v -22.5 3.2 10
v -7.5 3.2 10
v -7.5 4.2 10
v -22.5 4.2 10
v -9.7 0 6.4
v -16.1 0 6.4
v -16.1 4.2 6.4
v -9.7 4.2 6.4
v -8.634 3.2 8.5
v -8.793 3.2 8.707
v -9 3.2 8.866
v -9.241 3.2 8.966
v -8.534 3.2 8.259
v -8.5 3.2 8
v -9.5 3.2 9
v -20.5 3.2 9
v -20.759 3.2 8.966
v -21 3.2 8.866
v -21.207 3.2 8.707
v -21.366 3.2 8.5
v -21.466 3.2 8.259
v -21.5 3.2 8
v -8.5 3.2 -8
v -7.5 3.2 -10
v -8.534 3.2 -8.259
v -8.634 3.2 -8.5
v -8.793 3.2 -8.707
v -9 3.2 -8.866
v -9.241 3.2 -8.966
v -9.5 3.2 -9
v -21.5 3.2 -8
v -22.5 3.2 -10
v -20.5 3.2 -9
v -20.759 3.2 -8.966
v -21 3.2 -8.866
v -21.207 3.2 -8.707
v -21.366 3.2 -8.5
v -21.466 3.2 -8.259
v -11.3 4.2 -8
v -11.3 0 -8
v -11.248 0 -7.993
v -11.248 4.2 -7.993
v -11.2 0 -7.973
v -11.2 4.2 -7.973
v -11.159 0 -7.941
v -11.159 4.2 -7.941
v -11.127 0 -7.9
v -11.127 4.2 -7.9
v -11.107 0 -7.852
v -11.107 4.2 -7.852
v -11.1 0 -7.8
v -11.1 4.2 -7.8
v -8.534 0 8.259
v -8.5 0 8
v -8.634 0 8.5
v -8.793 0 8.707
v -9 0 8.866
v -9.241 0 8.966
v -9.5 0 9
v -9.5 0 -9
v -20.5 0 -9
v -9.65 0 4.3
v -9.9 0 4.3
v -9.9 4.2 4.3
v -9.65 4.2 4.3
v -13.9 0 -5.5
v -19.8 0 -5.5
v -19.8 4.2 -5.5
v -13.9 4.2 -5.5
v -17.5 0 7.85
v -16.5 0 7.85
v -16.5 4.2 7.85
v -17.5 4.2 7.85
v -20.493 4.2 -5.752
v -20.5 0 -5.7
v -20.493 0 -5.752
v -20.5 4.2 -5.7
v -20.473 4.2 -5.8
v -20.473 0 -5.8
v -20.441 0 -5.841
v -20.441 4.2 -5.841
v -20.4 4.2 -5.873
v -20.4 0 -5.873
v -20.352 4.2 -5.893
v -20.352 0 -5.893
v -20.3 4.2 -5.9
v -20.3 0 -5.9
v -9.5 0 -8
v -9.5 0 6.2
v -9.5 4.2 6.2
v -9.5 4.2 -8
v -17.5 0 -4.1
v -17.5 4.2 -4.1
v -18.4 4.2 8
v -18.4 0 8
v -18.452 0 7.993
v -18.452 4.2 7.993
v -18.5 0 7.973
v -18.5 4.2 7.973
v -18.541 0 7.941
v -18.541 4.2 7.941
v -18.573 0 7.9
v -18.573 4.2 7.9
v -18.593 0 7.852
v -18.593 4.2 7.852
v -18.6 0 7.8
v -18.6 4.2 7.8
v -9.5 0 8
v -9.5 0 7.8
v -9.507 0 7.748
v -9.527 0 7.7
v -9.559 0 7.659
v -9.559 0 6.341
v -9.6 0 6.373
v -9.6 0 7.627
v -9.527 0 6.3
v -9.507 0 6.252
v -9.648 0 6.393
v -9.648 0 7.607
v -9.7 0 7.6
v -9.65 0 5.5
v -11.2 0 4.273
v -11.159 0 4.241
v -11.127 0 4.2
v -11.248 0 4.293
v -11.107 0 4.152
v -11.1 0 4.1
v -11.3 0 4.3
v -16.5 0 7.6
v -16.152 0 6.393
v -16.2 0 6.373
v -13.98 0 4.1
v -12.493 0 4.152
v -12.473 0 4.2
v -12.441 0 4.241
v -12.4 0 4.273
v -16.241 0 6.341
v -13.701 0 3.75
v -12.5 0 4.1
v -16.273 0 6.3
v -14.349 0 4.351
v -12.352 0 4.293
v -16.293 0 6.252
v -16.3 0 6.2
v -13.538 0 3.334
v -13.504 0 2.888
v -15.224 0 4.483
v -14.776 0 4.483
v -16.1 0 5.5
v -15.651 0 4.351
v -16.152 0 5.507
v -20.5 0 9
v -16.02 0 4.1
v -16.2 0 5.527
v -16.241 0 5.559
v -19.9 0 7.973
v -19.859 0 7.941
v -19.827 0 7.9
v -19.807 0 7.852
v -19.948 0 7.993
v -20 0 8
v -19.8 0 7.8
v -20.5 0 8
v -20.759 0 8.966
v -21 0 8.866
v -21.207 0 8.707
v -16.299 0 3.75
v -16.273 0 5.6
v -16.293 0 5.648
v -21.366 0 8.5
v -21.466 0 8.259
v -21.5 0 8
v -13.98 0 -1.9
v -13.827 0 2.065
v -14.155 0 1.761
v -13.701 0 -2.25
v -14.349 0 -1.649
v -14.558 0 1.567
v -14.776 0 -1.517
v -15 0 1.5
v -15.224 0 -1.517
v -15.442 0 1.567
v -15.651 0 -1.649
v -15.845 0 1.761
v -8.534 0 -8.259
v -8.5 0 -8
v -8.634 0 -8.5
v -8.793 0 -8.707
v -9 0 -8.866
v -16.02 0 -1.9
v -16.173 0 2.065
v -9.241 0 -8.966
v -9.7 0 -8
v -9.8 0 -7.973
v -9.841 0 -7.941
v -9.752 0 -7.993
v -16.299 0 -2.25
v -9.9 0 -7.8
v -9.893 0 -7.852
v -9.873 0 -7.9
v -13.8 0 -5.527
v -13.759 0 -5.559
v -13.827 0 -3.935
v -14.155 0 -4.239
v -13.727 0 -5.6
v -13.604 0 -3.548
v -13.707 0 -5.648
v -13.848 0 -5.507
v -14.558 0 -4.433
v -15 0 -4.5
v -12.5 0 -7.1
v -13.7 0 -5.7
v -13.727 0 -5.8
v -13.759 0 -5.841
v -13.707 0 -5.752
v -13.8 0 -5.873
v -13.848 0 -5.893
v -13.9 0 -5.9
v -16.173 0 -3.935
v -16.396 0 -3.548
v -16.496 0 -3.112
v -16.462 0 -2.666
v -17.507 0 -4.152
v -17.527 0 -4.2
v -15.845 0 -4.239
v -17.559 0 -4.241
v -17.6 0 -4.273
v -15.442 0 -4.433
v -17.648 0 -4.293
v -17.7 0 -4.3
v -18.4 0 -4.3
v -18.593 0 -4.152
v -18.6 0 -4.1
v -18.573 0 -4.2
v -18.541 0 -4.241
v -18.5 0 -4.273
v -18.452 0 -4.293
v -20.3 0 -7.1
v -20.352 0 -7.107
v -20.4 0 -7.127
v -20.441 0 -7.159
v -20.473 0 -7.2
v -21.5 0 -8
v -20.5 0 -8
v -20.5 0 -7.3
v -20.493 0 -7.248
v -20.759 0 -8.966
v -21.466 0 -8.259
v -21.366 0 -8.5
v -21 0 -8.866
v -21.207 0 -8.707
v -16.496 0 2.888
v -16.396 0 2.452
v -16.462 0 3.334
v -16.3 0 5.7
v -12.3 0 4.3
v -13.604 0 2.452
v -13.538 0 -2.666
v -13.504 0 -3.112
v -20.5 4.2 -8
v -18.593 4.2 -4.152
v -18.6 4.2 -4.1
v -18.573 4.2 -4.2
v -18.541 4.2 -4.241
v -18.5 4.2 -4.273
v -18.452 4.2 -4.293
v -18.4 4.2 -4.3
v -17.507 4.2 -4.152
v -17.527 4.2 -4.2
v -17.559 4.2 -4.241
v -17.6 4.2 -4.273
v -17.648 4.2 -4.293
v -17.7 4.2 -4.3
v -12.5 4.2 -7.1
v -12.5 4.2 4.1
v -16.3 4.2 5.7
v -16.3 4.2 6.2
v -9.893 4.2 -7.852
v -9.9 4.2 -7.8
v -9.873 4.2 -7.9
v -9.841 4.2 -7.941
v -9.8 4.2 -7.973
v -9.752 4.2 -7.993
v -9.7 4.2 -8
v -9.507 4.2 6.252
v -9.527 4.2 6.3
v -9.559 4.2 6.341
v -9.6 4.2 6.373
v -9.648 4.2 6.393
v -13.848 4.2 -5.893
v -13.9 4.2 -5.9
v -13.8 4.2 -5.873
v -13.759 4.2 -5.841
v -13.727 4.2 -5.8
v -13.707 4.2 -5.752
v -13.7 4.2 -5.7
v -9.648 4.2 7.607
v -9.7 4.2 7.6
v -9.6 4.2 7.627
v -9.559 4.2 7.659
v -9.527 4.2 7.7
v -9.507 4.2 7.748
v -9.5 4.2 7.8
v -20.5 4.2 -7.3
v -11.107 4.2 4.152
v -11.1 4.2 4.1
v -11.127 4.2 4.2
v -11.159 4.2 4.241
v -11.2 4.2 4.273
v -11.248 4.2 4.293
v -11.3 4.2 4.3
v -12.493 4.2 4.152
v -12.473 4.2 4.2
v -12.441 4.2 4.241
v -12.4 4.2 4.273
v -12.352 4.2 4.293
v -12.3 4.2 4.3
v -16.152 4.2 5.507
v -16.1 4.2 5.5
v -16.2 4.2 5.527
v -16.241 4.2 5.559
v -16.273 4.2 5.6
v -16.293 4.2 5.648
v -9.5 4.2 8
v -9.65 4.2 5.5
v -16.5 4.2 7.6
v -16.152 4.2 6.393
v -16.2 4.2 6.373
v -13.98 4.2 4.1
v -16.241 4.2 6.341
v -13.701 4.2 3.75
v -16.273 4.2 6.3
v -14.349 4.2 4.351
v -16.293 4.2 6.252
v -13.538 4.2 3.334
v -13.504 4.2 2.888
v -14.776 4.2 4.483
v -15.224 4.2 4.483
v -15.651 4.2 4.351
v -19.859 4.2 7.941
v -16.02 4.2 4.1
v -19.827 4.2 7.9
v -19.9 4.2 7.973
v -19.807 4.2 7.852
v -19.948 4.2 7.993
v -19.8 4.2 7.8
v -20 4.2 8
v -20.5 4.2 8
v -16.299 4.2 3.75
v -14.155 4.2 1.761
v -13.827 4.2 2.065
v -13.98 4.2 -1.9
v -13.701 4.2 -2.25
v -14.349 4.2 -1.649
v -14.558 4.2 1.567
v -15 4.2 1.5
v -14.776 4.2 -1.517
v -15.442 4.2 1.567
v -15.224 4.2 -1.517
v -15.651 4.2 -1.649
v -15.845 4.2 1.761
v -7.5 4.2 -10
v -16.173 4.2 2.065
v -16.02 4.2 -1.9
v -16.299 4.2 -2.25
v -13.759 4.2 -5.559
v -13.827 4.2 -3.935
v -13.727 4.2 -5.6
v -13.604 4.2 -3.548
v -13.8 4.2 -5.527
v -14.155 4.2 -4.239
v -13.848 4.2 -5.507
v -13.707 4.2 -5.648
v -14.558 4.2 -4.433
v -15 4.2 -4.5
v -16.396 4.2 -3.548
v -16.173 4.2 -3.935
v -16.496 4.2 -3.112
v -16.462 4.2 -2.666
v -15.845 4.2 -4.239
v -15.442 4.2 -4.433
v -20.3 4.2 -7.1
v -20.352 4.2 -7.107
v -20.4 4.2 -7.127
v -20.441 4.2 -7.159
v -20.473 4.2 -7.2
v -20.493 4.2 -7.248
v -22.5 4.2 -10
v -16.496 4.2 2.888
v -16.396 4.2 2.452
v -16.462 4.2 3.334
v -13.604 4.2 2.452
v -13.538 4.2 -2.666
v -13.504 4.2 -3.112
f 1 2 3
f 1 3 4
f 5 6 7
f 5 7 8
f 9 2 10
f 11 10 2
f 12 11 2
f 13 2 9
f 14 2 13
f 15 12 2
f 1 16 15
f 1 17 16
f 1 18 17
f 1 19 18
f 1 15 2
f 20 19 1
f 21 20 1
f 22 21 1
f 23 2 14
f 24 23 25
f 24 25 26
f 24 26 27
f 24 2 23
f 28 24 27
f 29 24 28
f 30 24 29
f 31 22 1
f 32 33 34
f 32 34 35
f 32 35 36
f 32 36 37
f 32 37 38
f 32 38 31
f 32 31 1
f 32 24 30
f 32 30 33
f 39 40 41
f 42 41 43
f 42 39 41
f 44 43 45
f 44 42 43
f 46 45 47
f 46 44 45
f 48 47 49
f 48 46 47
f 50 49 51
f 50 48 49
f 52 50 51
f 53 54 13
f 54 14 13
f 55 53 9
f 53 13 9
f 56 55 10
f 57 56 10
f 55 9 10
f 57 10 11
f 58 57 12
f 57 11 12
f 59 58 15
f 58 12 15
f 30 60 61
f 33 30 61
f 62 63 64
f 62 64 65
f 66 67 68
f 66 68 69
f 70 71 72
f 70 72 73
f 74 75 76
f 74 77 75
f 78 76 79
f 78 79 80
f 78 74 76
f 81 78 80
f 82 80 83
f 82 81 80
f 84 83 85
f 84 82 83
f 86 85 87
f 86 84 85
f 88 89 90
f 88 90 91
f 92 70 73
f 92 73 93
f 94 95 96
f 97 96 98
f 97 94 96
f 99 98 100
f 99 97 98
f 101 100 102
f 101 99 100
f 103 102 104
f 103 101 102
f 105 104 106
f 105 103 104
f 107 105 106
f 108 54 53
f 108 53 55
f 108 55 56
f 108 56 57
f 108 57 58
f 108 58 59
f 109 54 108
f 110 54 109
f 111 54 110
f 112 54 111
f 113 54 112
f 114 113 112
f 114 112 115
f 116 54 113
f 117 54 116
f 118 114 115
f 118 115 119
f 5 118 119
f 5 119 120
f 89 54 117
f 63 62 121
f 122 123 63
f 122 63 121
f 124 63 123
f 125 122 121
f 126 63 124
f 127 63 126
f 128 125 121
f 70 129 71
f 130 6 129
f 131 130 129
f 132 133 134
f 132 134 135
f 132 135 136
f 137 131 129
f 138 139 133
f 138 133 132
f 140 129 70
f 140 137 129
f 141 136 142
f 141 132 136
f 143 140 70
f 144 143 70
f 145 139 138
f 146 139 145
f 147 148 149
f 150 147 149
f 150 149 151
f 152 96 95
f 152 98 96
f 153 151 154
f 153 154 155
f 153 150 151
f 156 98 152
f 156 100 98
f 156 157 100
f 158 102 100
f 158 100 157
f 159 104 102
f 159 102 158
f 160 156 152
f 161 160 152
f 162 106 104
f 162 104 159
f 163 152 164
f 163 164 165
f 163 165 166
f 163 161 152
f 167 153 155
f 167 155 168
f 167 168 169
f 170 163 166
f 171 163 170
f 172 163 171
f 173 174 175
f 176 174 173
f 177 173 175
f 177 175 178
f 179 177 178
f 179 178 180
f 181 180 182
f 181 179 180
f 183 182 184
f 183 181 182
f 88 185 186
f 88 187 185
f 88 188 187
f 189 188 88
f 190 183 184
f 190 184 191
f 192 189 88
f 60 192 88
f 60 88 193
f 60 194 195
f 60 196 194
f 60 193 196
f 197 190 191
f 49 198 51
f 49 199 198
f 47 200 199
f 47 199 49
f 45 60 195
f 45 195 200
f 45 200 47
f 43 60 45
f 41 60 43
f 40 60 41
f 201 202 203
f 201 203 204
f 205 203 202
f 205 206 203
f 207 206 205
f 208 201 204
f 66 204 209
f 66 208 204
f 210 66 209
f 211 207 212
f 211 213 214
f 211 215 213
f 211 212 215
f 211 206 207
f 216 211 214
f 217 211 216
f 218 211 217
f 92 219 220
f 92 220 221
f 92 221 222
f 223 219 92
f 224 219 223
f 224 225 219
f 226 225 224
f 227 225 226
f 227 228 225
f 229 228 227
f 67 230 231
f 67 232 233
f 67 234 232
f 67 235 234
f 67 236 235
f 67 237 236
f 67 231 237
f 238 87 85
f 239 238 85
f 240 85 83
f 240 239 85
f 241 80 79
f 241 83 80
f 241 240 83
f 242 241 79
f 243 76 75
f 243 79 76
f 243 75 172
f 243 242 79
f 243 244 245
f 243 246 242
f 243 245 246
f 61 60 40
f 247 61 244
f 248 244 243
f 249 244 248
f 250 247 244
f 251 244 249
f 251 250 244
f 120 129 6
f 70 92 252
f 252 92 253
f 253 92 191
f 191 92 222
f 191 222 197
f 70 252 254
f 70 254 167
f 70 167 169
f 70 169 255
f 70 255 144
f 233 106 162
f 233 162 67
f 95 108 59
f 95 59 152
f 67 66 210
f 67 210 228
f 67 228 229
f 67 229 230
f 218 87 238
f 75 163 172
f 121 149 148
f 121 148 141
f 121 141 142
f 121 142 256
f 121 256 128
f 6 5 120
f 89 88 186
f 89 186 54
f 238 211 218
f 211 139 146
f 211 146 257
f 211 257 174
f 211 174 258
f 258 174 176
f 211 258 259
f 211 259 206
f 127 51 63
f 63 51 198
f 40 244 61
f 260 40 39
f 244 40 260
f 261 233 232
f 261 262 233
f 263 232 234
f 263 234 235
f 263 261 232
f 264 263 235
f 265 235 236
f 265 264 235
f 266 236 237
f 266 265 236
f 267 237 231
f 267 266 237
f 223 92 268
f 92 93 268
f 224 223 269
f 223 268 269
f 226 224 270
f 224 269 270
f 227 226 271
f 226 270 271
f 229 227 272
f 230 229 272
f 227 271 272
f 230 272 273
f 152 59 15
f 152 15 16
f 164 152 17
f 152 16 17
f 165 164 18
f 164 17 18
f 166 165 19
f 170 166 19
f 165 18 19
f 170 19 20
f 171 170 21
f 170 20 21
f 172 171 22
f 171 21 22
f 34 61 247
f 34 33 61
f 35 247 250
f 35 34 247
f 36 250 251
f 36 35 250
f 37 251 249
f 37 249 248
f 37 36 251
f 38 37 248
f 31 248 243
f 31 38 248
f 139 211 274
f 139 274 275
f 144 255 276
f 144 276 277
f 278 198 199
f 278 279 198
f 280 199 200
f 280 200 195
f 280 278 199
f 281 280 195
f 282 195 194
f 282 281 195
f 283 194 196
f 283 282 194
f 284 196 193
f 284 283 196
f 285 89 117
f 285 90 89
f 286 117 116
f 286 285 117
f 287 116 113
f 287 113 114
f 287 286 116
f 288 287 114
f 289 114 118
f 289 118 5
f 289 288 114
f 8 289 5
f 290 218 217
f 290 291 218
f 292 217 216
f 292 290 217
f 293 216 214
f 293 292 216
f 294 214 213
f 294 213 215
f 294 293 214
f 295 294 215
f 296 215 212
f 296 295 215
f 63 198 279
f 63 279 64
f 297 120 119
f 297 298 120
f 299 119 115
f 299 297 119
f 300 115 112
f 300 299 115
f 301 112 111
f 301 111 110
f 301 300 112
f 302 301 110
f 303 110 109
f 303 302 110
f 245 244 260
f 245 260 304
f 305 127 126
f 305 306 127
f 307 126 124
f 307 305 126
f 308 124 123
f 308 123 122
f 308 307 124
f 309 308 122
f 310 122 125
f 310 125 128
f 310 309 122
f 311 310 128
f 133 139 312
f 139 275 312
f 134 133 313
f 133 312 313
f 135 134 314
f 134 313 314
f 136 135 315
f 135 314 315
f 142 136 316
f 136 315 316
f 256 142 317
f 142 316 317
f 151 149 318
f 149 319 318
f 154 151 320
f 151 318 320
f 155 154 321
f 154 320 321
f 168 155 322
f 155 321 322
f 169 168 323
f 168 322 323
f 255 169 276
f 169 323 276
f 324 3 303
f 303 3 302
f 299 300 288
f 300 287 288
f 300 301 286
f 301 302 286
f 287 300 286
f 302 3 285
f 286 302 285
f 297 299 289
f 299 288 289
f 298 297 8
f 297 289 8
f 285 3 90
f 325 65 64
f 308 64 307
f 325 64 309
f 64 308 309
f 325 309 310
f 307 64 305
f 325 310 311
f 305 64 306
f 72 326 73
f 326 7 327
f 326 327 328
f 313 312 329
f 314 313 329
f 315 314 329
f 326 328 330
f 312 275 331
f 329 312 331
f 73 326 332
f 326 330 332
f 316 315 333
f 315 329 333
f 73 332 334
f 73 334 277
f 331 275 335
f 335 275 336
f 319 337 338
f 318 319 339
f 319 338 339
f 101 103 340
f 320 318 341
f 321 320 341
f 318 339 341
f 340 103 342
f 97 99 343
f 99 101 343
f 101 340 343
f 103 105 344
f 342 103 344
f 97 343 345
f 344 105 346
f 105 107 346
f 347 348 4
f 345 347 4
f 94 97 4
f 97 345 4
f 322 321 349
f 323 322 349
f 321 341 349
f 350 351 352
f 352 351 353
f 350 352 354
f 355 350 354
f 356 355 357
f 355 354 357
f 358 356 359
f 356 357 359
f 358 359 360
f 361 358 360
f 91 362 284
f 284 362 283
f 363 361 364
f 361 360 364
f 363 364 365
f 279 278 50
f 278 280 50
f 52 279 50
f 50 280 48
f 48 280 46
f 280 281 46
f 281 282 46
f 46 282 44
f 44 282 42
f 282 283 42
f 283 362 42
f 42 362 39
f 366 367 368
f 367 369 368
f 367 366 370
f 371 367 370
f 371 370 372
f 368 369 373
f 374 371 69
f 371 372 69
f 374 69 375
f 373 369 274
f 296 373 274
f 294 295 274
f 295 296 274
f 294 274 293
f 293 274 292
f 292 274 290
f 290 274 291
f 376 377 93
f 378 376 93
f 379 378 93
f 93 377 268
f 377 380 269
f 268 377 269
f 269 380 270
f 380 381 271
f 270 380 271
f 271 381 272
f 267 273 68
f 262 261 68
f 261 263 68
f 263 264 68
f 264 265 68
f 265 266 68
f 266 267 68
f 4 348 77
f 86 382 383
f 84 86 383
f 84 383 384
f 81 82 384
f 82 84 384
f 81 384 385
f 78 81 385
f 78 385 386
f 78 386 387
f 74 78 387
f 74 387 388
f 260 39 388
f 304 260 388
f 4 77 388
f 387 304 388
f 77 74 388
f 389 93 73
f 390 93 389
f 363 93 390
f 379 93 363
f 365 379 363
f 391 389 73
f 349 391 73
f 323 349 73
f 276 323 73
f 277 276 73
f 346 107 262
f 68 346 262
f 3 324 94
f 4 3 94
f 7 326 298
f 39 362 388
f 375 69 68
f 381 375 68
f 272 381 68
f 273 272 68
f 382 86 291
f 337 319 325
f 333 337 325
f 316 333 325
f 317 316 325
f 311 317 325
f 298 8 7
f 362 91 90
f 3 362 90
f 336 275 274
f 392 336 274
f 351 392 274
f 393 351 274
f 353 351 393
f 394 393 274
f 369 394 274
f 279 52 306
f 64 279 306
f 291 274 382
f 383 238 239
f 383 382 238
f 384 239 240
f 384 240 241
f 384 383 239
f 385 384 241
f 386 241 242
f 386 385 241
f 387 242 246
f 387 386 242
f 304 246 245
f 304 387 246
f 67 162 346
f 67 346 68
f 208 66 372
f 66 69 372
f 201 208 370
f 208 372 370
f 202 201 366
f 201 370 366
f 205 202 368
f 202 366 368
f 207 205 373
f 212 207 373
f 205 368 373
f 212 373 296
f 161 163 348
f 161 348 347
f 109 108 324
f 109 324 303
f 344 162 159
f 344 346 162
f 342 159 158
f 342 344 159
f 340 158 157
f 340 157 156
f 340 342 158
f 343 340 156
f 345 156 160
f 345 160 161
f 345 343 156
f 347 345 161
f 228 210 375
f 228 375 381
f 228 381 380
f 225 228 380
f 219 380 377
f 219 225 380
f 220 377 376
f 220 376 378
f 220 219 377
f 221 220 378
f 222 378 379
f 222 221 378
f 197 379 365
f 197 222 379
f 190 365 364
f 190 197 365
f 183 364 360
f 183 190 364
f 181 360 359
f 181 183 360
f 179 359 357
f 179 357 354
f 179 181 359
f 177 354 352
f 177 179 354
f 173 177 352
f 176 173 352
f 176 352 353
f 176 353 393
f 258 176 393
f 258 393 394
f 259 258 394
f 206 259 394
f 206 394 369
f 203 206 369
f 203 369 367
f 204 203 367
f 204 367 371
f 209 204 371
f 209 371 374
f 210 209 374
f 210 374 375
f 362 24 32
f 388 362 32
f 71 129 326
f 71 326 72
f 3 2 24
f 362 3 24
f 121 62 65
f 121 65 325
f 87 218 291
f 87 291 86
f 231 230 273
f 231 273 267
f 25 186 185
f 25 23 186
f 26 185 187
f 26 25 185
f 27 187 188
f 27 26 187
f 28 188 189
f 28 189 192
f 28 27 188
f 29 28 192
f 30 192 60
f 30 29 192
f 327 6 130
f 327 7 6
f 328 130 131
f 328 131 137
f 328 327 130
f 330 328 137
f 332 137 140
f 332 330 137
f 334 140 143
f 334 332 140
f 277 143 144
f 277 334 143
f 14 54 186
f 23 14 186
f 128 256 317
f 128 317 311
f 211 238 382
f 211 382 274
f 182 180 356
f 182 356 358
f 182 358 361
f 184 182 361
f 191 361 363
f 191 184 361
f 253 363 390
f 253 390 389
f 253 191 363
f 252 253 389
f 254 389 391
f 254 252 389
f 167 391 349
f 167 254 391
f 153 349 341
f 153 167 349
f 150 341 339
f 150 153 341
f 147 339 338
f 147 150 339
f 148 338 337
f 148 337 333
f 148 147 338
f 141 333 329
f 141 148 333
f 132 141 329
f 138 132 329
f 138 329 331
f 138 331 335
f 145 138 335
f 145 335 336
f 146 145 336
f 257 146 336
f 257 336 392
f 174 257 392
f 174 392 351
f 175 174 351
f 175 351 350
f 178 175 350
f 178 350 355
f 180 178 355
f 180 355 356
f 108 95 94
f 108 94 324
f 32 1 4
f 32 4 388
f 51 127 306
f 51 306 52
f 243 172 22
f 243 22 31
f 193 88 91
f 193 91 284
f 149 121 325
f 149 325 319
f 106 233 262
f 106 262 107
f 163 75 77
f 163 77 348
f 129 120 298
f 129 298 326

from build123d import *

# Parameters (mm, degrees)
SKETCH1_W           = 13
SKETCH1_H           = 18
BOSS_EXTRUDE1_DEPTH = 3.2
SKETCH2_W           = 15
SKETCH2_H           = 20
BOSS_EXTRUDE2_DEPTH = 1
SKETCH3_R           = 1.5
CUT_EXTRUDE1_DEPTH  = 14.18673576
FILLET1_R           = 0.2
FILLET2_R           = 1


with BuildPart() as part:
    # Sketch1 → Boss-Extrude1 (new body)
    with BuildSketch(Plane(origin=(0, 0, 0), x_dir=(1, 0, 0), z_dir=(0, 1, 0))):
        Rectangle(SKETCH1_W, SKETCH1_H)
    extrude(amount=BOSS_EXTRUDE1_DEPTH)

    # Sketch2 → Boss-Extrude2 (add)
    with BuildSketch(Plane(origin=(0, 3.2, 0), x_dir=(1, 0, 0), z_dir=(0, 1, 0))):
        Rectangle(SKETCH2_W, SKETCH2_H)
    extrude(amount=BOSS_EXTRUDE2_DEPTH)

    # Sketch3 → Cut-Extrude1 (cut, through all)
    with BuildSketch(Plane.XZ):
        with Locations(Location((0, 3, 0), (0, 0, 270))):
            Circle(SKETCH3_R)
        with Locations(Location((0, -3, 0), (0, 0, 270))):
            Circle(SKETCH3_R)
        Polygon((4.8, -5.5), (-1.3, -5.5), (-1.3, -5.9), (5.5, -5.9), (5.5, 8), (4.8, 8), align=None)
        Polygon((2.5, 7.85), (2.5, -4.3), (3.6, -4.3), (3.6, 8), (-5.5, 8), (-5.5, 7.6), (1.5, 7.6), (1.5, 7.85), align=None)
        Polygon((-2.5, -7.1), (-2.5, 4.3), (-3.9, 4.3), (-3.9, -8), (5.5, -8), (5.5, -7.1), align=None)
        Polygon((-5.35, 5.5), (1.3, 5.5), (1.3, 6.4), (-5.5, 6.4), (-5.5, -8), (-5.1, -8), (-5.1, 4.3), (-5.35, 4.3), align=None)
    extrude(amount=-CUT_EXTRUDE1_DEPTH, mode=Mode.SUBTRACT)

    # Fillet1
    fillet1_edges = [part.edges().sort_by_distance(p)[0] for p in [
        (-5.1, 2.1, -8),
        (-3.9, 2.1, -8),
        (-5.5, 2.1, 6.4),
        (-5.5, 2.1, 7.6),
        (4.8, 2.1, 8),
        (3.6, 2.1, 8),
        (-3.9, 2.1, 4.3),
        (-2.5, 2.1, 4.3),
        (1.3, 2.1, 5.5),
        (1.3, 2.1, 6.4),
        (5.5, 2.1, -7.1),
        (5.5, 2.1, -5.9),
        (-1.3, 2.1, -5.9),
        (-1.3, 2.1, -5.5),
        (3.6, 2.1, -4.3),
        (2.5, 2.1, -4.3),
    ]]
    fillet(fillet1_edges, radius=FILLET1_R - 0.0001)  # a hair under: the kernel refuses the full size

    # Fillet2
    fillet2_edges = [part.edges().sort_by_distance(p)[0] for p in [
        (6.5, 1.6, 9),
        (-6.5, 1.6, 9),
        (-6.5, 1.6, -9),
        (6.5, 1.6, -9),
    ]]
    fillet(fillet2_edges, radius=FILLET2_R)


with BuildPart() as body_2:
    # Mirror1: mirrored copy
    add(part.part.mirror(Plane(origin=(-7.5, 4.2, -10), x_dir=(0, 0, 1), z_dir=(1, 0, 0))))


solid = body_2.part
